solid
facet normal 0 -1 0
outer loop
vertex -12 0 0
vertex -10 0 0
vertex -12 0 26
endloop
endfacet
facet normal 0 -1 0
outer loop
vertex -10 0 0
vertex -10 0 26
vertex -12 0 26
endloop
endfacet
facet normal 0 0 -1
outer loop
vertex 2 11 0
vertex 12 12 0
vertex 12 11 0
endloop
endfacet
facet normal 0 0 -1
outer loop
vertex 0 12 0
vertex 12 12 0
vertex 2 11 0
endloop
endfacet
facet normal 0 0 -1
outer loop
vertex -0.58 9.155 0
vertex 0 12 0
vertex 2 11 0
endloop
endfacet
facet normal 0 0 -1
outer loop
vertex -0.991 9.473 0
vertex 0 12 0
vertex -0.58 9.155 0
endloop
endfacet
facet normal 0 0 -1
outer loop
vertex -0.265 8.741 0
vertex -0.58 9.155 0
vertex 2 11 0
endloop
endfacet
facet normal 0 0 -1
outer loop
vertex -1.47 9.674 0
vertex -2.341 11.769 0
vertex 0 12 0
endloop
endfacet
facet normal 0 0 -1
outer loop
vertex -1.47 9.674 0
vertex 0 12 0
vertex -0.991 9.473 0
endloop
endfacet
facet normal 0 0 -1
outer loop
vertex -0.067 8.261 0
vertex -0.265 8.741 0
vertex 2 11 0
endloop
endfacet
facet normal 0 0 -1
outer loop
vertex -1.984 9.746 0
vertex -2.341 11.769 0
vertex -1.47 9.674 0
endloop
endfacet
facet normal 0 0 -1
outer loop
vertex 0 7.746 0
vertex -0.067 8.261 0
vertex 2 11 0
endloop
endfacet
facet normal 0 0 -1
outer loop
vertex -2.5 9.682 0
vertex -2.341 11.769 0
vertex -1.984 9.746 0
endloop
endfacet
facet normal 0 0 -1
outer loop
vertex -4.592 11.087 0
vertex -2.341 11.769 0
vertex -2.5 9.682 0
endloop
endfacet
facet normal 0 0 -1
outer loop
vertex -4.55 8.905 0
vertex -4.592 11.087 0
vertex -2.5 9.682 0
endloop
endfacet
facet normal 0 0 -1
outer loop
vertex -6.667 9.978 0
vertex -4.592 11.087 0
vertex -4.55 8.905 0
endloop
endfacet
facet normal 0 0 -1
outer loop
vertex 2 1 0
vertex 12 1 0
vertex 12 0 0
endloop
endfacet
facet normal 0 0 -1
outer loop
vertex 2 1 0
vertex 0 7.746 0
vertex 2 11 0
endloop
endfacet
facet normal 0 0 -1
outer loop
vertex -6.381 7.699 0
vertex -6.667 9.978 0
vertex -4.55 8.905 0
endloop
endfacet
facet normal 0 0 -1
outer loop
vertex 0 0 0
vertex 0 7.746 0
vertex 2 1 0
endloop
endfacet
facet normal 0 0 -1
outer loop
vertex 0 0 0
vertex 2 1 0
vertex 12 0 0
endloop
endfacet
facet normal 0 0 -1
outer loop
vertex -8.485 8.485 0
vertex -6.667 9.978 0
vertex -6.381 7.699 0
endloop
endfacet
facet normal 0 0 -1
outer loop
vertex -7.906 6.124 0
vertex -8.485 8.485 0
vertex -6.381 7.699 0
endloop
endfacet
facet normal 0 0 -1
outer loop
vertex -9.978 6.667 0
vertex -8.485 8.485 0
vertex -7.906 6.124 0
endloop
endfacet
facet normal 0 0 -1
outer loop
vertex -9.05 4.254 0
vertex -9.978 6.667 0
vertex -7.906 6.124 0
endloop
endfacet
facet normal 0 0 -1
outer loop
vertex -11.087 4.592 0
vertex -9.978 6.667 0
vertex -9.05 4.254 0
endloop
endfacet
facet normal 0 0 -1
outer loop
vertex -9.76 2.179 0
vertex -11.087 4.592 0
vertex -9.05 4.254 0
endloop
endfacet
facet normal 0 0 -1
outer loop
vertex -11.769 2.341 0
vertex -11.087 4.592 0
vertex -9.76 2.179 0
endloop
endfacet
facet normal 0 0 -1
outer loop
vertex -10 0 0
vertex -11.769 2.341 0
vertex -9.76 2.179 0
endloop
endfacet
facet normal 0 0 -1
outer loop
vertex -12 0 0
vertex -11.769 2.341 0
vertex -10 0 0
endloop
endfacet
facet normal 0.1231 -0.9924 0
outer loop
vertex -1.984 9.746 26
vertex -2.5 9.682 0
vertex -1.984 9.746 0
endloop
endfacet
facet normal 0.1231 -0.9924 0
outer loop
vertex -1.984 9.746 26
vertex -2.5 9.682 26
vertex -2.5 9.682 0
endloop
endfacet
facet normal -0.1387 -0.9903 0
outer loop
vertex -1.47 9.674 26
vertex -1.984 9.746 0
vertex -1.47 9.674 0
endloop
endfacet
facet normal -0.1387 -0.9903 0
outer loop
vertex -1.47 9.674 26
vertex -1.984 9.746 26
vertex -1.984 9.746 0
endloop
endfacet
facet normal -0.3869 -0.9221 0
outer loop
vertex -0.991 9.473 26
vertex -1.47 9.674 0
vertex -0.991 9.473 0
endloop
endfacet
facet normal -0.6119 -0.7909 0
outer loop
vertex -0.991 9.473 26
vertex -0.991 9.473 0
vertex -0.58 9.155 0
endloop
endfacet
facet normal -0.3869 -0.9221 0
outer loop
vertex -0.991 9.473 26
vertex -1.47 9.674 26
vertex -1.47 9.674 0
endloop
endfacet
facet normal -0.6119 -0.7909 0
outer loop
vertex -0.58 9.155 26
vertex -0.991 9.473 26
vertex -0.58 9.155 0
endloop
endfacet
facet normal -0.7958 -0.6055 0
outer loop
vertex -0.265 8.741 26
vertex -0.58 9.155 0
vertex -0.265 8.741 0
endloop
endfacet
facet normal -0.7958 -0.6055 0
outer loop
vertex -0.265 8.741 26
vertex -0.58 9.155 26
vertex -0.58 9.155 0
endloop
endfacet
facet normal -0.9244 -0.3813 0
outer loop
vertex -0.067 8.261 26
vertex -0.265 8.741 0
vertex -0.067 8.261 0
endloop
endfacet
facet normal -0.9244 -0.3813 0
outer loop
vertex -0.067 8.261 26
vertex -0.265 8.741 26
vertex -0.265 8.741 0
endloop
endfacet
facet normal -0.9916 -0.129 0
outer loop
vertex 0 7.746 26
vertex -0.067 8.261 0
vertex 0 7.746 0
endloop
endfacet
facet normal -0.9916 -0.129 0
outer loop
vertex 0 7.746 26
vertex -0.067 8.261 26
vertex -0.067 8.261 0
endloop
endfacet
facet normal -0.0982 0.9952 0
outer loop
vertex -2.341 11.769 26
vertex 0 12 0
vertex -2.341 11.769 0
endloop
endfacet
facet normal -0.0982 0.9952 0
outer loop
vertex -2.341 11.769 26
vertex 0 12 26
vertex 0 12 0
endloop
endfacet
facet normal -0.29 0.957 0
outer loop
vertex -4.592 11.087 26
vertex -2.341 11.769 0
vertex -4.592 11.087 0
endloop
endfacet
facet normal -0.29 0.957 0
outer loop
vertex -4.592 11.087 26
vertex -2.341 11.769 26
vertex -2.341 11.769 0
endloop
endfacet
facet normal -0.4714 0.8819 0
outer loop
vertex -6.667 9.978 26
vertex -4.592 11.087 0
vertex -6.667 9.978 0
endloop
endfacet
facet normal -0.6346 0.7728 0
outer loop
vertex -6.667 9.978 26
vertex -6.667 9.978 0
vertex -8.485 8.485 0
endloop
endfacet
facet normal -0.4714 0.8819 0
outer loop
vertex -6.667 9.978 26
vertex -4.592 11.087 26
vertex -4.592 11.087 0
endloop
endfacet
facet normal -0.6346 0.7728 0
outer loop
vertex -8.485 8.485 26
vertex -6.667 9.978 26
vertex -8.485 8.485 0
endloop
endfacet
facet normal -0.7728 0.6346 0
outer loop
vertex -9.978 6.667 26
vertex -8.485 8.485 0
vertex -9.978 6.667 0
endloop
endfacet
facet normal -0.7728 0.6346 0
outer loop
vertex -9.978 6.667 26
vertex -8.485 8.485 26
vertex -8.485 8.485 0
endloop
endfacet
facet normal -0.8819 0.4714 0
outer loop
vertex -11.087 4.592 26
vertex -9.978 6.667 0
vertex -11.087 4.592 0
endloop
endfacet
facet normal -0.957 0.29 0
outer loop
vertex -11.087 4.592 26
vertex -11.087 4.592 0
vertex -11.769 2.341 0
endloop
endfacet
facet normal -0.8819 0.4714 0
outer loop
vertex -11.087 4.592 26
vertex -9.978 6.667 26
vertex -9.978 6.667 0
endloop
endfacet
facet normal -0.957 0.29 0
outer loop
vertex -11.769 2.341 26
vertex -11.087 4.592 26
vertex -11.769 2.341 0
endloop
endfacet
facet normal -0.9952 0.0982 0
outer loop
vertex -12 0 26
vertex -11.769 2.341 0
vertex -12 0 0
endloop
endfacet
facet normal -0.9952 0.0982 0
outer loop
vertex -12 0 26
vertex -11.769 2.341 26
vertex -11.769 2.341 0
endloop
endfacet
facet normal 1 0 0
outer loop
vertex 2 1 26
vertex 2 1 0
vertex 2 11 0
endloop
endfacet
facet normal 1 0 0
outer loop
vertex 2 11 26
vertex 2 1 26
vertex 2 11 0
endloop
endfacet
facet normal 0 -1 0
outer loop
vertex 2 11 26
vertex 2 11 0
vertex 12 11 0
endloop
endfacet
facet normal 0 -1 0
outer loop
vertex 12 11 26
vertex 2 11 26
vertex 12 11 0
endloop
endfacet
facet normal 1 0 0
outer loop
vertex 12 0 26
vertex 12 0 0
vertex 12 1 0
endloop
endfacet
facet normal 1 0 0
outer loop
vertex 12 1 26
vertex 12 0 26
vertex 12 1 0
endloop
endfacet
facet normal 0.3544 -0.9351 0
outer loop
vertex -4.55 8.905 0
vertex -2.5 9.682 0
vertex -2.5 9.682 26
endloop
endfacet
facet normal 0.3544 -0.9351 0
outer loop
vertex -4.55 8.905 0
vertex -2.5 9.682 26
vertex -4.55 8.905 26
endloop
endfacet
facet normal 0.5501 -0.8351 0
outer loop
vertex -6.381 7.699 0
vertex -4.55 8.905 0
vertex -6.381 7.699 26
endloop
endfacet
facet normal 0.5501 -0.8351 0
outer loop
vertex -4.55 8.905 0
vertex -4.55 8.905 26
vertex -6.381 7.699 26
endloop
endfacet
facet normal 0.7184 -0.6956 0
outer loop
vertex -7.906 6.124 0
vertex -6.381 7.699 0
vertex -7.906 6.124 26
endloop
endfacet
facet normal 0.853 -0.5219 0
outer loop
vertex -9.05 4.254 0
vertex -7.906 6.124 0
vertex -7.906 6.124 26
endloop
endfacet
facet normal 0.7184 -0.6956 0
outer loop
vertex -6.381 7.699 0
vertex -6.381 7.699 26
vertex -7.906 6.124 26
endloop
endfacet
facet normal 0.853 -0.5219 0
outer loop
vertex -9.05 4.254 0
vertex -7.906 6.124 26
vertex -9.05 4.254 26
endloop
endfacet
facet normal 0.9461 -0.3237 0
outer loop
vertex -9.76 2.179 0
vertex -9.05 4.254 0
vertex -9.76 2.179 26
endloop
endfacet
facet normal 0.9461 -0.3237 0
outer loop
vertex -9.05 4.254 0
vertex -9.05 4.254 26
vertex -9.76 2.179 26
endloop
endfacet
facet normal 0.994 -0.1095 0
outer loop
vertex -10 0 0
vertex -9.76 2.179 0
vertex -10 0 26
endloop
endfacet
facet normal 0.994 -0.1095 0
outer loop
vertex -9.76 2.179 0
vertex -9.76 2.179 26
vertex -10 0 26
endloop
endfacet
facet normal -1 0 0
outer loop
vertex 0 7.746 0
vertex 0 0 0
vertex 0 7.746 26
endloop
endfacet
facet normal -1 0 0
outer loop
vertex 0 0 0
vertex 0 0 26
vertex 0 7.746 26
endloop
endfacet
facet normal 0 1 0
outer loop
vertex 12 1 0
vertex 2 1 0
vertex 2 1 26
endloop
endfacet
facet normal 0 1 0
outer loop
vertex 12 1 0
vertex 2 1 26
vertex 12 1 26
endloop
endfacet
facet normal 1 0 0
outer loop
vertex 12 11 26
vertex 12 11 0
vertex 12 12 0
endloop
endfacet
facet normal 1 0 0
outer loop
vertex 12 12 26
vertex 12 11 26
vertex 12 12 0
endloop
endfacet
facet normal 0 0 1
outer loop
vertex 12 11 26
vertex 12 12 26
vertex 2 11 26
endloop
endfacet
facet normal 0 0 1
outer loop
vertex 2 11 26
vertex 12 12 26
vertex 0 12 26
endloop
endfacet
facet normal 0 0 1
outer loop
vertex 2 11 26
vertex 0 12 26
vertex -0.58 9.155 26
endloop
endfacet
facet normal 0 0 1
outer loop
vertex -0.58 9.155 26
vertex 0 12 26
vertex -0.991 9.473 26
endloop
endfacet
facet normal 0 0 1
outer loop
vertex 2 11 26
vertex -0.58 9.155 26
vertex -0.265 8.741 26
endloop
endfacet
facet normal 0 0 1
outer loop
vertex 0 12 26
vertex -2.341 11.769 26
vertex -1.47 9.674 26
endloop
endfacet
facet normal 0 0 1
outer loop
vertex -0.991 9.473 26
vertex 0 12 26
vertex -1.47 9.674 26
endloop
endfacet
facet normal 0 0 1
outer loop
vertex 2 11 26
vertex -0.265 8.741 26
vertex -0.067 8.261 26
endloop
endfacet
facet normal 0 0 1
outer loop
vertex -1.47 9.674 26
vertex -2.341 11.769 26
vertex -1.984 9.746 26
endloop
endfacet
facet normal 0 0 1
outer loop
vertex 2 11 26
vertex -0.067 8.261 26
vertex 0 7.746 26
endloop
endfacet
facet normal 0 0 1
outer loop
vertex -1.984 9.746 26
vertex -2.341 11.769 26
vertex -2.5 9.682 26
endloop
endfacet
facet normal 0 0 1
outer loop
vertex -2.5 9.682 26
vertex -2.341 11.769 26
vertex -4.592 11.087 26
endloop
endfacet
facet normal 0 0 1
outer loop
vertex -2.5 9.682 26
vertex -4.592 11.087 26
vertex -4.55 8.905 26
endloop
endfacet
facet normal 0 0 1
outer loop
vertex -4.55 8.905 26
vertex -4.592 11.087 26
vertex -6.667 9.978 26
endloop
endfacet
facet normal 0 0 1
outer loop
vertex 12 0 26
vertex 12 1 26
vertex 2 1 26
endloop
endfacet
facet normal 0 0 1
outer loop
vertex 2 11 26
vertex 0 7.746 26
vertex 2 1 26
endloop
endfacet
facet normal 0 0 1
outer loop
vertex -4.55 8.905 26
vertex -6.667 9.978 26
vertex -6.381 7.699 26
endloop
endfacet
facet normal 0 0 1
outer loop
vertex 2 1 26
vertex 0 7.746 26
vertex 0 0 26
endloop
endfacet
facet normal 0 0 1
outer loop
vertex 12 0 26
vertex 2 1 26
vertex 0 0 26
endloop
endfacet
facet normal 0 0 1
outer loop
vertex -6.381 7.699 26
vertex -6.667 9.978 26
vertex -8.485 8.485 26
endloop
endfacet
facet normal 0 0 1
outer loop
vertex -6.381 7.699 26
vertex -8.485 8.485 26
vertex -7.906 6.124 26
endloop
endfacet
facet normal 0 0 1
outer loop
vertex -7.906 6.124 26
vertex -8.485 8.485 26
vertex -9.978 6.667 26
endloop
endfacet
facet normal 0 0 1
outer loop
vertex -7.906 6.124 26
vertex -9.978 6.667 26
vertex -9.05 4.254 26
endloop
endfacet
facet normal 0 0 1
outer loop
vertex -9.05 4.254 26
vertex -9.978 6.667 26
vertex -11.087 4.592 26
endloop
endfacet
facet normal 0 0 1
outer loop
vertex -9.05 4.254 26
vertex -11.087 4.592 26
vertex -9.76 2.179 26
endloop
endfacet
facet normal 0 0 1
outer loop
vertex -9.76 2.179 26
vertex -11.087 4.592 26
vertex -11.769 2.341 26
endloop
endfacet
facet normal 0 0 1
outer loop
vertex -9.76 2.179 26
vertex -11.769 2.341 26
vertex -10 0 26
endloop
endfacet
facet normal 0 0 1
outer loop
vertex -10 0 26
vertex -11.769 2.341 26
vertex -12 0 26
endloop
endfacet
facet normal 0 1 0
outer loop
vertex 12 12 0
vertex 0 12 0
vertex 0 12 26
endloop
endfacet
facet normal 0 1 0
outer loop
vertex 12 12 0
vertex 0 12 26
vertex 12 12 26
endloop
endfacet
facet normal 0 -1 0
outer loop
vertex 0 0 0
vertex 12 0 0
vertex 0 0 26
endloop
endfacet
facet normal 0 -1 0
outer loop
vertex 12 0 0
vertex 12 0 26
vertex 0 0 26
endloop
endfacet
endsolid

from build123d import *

# Parameters (mm, degrees)
CYLINDER001_W     = 10
CYLINDER001_H     = 26
CYLINDER001_ANGLE = 90
BOX001_W          = 10
BOX001_H          = 10
BOX001_DEPTH      = 26
CYLINDER_W        = 12
CYLINDER_H        = 26
CYLINDER_ANGLE    = 90
BOX_W             = 12
BOX_H             = 12
BOX_DEPTH         = 26
FILLET_R          = 2


with BuildPart() as cylinder001:
    # Cylinder001 → Cylinder001 (revolve)
    with BuildSketch(Plane.YZ):
        with Locations((5, 13)):
            Rectangle(CYLINDER001_W, CYLINDER001_H)
    revolve(axis=Axis((0, 0, 0), (0, 0, 1)), revolution_arc=CYLINDER001_ANGLE)


with BuildPart() as cube001:
    # Box001 → Box001 (new body)
    with BuildSketch(Plane(origin=(2, 1, 0), x_dir=(1, 0, 0), z_dir=(0, 0, 1))):
        with Locations((5, 5)):
            Rectangle(BOX001_W, BOX001_H)
    extrude(amount=BOX001_DEPTH)


with BuildPart() as cylinder:
    # Cylinder → Cylinder (revolve)
    with BuildSketch(Plane.YZ):
        with Locations((6, 13)):
            Rectangle(CYLINDER_W, CYLINDER_H)
    revolve(axis=Axis((0, 0, 0), (0, 0, 1)), revolution_arc=CYLINDER_ANGLE)


with BuildPart() as fillet_body:
    # Box → Box (new body)
    with BuildSketch(Plane.XY):
        with Locations((6, 6)):
            Rectangle(BOX_W, BOX_H)
    extrude(amount=BOX_DEPTH)

    # Fusion: union Cylinder
    add(cylinder.part)

    # Cut: cut Cube001
    add(cube001.part, mode=Mode.SUBTRACT)

    # Cut001: cut Cylinder001
    add(cylinder001.part, mode=Mode.SUBTRACT)

    # Fillet
    fillet_edges = [fillet_body.edges().sort_by_distance(p)[0] for p in [
        (0, 10, 13),
    ]]
    fillet(fillet_edges, radius=FILLET_R)


solid = fillet_body.part
